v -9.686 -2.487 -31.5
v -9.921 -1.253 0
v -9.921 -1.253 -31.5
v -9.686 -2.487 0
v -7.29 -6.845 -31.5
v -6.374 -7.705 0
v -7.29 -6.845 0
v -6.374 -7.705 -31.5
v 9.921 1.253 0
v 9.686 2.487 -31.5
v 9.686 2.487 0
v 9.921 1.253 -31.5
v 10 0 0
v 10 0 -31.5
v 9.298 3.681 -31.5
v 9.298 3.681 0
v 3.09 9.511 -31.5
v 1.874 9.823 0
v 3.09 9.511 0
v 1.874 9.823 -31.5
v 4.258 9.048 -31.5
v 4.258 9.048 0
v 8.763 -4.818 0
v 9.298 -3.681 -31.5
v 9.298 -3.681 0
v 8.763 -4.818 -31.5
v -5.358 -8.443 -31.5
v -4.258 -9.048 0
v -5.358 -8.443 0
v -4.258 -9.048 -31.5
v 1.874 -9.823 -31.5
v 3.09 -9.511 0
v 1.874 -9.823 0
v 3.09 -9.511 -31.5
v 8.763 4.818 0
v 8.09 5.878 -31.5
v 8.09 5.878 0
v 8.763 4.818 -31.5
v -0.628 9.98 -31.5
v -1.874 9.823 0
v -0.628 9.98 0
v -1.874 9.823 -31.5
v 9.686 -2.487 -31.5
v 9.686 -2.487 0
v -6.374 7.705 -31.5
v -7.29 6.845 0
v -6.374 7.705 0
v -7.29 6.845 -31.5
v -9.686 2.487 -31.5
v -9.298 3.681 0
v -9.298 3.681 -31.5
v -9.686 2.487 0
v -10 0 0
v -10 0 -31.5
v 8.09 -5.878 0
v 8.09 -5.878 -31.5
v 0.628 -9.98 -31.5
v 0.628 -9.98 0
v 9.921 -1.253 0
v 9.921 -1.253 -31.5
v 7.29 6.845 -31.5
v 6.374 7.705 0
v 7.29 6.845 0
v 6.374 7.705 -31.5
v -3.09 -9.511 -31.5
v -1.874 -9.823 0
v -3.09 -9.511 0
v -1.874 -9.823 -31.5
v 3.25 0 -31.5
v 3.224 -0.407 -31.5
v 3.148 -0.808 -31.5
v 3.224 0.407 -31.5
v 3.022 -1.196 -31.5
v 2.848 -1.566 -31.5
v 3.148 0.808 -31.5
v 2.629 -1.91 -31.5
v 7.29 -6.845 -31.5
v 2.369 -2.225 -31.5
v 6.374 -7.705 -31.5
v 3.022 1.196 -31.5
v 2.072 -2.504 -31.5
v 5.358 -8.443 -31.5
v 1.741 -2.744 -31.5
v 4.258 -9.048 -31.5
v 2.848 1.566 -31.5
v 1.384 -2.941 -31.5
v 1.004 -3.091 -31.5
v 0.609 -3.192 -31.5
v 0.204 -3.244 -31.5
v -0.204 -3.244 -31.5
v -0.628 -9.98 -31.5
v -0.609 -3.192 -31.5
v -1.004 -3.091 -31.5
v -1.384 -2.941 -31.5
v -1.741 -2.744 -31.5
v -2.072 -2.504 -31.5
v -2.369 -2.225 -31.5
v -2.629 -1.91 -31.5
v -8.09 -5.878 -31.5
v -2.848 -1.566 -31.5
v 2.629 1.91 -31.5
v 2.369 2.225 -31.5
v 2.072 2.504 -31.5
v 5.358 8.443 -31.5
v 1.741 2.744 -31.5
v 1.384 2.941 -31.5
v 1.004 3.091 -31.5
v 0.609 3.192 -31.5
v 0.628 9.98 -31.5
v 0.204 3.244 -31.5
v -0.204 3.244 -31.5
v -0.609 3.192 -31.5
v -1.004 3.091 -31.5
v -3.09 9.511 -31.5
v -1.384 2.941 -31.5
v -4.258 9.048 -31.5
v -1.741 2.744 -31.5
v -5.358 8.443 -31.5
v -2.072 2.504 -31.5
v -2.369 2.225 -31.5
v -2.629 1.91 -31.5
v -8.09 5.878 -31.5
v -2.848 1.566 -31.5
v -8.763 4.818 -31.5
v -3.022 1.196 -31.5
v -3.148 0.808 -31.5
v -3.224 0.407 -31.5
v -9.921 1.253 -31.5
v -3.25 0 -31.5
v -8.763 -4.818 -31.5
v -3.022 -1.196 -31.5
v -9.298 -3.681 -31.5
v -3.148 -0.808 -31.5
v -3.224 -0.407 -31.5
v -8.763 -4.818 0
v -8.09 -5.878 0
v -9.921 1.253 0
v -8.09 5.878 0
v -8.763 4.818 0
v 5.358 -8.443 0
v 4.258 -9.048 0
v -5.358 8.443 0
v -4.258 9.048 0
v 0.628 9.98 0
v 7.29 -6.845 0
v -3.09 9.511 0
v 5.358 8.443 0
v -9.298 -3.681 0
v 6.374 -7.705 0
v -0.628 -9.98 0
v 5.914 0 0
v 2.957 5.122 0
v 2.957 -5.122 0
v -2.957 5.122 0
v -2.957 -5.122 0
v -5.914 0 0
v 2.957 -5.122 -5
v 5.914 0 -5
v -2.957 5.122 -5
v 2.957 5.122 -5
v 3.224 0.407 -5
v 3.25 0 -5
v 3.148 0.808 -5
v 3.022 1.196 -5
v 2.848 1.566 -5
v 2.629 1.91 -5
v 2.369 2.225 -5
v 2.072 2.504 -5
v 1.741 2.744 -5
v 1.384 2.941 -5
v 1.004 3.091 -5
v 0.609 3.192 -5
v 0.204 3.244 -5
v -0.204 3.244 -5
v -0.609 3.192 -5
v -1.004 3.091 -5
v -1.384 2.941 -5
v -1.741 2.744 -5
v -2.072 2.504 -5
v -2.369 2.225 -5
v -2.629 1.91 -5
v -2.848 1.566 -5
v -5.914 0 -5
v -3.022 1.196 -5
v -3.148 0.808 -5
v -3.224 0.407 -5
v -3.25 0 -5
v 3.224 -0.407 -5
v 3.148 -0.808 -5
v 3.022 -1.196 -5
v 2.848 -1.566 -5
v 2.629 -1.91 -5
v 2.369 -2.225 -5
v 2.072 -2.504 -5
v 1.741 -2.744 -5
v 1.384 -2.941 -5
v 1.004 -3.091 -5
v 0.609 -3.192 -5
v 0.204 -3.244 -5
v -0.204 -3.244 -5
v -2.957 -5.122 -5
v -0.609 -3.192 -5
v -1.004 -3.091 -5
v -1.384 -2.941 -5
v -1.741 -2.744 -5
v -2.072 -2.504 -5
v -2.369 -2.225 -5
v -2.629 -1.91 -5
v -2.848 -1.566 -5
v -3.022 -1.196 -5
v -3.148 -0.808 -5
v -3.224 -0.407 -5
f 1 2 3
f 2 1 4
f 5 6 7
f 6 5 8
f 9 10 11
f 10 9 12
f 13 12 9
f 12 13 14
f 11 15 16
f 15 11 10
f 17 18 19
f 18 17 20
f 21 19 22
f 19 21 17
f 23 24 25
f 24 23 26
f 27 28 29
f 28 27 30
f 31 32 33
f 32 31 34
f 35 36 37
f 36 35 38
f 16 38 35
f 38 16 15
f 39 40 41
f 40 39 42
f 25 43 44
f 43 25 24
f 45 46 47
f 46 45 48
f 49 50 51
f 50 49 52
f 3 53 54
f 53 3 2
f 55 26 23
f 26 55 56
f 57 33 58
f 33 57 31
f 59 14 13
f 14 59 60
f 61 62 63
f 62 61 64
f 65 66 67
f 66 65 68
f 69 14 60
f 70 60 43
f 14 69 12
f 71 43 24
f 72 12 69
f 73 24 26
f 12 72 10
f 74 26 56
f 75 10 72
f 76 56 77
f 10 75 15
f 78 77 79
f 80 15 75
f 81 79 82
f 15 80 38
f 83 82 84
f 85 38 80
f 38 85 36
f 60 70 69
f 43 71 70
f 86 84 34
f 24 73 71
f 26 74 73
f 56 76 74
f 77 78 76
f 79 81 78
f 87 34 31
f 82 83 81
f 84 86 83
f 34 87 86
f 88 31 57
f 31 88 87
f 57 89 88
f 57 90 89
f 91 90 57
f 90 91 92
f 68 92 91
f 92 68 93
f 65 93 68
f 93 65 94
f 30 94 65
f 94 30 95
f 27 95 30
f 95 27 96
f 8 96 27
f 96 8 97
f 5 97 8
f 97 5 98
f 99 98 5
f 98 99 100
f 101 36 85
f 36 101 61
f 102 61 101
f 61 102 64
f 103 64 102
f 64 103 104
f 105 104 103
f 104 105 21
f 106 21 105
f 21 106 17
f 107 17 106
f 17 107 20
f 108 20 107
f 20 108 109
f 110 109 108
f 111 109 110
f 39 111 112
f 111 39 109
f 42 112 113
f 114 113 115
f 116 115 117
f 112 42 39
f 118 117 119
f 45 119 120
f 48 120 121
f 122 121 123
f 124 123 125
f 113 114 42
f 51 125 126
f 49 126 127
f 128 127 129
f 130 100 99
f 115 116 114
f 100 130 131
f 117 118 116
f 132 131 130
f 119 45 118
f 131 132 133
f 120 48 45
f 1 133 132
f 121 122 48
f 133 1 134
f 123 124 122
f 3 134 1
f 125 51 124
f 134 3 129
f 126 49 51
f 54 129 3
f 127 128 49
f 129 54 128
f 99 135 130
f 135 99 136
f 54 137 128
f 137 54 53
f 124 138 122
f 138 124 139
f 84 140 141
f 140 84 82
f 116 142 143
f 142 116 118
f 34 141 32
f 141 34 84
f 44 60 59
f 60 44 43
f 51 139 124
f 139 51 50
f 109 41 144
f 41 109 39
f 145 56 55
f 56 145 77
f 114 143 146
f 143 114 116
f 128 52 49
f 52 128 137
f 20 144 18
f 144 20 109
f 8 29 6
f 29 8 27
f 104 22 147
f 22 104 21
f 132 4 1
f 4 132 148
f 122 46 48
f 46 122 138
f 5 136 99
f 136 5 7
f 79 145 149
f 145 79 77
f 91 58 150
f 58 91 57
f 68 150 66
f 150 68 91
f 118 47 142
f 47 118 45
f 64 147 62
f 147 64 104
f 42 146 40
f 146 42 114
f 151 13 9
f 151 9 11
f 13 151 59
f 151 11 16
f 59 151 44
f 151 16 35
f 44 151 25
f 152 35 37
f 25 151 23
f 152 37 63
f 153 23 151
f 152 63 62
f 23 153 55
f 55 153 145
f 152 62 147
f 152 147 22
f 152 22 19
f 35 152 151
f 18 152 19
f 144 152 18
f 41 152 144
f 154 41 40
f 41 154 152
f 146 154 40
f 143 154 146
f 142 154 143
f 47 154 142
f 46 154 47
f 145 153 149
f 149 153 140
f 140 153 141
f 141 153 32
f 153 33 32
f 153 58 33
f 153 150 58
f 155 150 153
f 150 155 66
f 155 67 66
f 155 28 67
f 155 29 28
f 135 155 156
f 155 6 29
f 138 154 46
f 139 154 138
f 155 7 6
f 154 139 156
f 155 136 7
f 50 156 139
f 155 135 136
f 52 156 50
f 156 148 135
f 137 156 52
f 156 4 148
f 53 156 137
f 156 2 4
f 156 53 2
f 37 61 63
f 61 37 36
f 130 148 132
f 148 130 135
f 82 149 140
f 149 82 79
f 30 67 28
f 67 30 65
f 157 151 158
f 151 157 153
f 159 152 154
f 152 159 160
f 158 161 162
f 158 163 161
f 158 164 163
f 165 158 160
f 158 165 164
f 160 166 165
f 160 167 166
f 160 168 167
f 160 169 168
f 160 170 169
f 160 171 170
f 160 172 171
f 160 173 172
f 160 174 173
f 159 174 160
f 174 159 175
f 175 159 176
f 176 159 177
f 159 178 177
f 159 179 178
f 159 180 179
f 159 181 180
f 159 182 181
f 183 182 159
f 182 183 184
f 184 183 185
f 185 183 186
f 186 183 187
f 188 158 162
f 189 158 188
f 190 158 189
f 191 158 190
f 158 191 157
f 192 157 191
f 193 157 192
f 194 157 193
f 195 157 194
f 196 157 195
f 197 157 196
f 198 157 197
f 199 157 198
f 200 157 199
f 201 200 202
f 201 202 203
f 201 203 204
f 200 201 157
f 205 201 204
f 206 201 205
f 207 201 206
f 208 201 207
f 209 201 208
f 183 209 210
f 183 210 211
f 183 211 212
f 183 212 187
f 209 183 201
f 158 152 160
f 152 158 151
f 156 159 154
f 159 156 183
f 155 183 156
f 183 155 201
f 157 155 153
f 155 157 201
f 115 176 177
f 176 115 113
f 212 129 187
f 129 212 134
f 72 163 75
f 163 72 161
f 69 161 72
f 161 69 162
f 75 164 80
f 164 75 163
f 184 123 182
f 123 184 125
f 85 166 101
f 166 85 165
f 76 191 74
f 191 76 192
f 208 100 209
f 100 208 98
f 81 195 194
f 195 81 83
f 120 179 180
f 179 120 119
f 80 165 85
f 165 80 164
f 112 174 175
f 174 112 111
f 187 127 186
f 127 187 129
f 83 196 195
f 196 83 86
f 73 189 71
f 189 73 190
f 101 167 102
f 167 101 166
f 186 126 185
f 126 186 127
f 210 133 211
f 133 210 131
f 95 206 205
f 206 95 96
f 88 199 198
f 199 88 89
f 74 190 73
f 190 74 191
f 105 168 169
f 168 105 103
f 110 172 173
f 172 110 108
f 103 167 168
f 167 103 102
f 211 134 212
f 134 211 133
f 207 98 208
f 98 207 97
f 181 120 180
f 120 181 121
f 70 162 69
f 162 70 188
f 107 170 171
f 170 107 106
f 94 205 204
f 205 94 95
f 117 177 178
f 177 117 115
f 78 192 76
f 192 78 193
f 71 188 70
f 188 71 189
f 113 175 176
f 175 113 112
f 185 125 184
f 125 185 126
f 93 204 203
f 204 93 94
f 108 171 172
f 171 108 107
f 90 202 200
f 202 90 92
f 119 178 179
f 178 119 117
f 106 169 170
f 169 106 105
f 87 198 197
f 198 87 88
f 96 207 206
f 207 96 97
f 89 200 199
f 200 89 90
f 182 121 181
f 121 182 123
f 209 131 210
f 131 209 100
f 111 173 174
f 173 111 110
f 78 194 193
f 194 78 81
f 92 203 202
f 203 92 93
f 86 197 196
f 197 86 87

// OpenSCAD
$fn = 50;


difference() {
	union() {
		translate(v = [0, 0, -31.5000000000]) {
			cylinder(h = 31.5000000000, r = 10.0000000000);
		}
		#translate(v = [0, 0, -33.0000000000]) {
			cylinder(h = 33, r = 2.8750000000);
		}
	}
	union() {
		translate(v = [0, 0, 0]) {
			rotate(a = [0, 0, 0]) {
				difference() {
					union() {
						translate(v = [0, 0, -5]) {
							linear_extrude(height = 5) {
								polygon(points = [[5.9142500000, 0.0000000000], [2.9571250000, 5.1218907443], [-2.9571250000, 5.1218907443], [-5.9142500000, 0.0000000000], [-2.9571250000, -5.1218907443], [2.9571250000, -5.1218907443]]);
							}
						}
					}
					union();
				}
			}
		}
		#translate(v = [0, 0, -100.0000000000]) {
			cylinder(h = 200, r = 3.2500000000);
		}
	}
}
